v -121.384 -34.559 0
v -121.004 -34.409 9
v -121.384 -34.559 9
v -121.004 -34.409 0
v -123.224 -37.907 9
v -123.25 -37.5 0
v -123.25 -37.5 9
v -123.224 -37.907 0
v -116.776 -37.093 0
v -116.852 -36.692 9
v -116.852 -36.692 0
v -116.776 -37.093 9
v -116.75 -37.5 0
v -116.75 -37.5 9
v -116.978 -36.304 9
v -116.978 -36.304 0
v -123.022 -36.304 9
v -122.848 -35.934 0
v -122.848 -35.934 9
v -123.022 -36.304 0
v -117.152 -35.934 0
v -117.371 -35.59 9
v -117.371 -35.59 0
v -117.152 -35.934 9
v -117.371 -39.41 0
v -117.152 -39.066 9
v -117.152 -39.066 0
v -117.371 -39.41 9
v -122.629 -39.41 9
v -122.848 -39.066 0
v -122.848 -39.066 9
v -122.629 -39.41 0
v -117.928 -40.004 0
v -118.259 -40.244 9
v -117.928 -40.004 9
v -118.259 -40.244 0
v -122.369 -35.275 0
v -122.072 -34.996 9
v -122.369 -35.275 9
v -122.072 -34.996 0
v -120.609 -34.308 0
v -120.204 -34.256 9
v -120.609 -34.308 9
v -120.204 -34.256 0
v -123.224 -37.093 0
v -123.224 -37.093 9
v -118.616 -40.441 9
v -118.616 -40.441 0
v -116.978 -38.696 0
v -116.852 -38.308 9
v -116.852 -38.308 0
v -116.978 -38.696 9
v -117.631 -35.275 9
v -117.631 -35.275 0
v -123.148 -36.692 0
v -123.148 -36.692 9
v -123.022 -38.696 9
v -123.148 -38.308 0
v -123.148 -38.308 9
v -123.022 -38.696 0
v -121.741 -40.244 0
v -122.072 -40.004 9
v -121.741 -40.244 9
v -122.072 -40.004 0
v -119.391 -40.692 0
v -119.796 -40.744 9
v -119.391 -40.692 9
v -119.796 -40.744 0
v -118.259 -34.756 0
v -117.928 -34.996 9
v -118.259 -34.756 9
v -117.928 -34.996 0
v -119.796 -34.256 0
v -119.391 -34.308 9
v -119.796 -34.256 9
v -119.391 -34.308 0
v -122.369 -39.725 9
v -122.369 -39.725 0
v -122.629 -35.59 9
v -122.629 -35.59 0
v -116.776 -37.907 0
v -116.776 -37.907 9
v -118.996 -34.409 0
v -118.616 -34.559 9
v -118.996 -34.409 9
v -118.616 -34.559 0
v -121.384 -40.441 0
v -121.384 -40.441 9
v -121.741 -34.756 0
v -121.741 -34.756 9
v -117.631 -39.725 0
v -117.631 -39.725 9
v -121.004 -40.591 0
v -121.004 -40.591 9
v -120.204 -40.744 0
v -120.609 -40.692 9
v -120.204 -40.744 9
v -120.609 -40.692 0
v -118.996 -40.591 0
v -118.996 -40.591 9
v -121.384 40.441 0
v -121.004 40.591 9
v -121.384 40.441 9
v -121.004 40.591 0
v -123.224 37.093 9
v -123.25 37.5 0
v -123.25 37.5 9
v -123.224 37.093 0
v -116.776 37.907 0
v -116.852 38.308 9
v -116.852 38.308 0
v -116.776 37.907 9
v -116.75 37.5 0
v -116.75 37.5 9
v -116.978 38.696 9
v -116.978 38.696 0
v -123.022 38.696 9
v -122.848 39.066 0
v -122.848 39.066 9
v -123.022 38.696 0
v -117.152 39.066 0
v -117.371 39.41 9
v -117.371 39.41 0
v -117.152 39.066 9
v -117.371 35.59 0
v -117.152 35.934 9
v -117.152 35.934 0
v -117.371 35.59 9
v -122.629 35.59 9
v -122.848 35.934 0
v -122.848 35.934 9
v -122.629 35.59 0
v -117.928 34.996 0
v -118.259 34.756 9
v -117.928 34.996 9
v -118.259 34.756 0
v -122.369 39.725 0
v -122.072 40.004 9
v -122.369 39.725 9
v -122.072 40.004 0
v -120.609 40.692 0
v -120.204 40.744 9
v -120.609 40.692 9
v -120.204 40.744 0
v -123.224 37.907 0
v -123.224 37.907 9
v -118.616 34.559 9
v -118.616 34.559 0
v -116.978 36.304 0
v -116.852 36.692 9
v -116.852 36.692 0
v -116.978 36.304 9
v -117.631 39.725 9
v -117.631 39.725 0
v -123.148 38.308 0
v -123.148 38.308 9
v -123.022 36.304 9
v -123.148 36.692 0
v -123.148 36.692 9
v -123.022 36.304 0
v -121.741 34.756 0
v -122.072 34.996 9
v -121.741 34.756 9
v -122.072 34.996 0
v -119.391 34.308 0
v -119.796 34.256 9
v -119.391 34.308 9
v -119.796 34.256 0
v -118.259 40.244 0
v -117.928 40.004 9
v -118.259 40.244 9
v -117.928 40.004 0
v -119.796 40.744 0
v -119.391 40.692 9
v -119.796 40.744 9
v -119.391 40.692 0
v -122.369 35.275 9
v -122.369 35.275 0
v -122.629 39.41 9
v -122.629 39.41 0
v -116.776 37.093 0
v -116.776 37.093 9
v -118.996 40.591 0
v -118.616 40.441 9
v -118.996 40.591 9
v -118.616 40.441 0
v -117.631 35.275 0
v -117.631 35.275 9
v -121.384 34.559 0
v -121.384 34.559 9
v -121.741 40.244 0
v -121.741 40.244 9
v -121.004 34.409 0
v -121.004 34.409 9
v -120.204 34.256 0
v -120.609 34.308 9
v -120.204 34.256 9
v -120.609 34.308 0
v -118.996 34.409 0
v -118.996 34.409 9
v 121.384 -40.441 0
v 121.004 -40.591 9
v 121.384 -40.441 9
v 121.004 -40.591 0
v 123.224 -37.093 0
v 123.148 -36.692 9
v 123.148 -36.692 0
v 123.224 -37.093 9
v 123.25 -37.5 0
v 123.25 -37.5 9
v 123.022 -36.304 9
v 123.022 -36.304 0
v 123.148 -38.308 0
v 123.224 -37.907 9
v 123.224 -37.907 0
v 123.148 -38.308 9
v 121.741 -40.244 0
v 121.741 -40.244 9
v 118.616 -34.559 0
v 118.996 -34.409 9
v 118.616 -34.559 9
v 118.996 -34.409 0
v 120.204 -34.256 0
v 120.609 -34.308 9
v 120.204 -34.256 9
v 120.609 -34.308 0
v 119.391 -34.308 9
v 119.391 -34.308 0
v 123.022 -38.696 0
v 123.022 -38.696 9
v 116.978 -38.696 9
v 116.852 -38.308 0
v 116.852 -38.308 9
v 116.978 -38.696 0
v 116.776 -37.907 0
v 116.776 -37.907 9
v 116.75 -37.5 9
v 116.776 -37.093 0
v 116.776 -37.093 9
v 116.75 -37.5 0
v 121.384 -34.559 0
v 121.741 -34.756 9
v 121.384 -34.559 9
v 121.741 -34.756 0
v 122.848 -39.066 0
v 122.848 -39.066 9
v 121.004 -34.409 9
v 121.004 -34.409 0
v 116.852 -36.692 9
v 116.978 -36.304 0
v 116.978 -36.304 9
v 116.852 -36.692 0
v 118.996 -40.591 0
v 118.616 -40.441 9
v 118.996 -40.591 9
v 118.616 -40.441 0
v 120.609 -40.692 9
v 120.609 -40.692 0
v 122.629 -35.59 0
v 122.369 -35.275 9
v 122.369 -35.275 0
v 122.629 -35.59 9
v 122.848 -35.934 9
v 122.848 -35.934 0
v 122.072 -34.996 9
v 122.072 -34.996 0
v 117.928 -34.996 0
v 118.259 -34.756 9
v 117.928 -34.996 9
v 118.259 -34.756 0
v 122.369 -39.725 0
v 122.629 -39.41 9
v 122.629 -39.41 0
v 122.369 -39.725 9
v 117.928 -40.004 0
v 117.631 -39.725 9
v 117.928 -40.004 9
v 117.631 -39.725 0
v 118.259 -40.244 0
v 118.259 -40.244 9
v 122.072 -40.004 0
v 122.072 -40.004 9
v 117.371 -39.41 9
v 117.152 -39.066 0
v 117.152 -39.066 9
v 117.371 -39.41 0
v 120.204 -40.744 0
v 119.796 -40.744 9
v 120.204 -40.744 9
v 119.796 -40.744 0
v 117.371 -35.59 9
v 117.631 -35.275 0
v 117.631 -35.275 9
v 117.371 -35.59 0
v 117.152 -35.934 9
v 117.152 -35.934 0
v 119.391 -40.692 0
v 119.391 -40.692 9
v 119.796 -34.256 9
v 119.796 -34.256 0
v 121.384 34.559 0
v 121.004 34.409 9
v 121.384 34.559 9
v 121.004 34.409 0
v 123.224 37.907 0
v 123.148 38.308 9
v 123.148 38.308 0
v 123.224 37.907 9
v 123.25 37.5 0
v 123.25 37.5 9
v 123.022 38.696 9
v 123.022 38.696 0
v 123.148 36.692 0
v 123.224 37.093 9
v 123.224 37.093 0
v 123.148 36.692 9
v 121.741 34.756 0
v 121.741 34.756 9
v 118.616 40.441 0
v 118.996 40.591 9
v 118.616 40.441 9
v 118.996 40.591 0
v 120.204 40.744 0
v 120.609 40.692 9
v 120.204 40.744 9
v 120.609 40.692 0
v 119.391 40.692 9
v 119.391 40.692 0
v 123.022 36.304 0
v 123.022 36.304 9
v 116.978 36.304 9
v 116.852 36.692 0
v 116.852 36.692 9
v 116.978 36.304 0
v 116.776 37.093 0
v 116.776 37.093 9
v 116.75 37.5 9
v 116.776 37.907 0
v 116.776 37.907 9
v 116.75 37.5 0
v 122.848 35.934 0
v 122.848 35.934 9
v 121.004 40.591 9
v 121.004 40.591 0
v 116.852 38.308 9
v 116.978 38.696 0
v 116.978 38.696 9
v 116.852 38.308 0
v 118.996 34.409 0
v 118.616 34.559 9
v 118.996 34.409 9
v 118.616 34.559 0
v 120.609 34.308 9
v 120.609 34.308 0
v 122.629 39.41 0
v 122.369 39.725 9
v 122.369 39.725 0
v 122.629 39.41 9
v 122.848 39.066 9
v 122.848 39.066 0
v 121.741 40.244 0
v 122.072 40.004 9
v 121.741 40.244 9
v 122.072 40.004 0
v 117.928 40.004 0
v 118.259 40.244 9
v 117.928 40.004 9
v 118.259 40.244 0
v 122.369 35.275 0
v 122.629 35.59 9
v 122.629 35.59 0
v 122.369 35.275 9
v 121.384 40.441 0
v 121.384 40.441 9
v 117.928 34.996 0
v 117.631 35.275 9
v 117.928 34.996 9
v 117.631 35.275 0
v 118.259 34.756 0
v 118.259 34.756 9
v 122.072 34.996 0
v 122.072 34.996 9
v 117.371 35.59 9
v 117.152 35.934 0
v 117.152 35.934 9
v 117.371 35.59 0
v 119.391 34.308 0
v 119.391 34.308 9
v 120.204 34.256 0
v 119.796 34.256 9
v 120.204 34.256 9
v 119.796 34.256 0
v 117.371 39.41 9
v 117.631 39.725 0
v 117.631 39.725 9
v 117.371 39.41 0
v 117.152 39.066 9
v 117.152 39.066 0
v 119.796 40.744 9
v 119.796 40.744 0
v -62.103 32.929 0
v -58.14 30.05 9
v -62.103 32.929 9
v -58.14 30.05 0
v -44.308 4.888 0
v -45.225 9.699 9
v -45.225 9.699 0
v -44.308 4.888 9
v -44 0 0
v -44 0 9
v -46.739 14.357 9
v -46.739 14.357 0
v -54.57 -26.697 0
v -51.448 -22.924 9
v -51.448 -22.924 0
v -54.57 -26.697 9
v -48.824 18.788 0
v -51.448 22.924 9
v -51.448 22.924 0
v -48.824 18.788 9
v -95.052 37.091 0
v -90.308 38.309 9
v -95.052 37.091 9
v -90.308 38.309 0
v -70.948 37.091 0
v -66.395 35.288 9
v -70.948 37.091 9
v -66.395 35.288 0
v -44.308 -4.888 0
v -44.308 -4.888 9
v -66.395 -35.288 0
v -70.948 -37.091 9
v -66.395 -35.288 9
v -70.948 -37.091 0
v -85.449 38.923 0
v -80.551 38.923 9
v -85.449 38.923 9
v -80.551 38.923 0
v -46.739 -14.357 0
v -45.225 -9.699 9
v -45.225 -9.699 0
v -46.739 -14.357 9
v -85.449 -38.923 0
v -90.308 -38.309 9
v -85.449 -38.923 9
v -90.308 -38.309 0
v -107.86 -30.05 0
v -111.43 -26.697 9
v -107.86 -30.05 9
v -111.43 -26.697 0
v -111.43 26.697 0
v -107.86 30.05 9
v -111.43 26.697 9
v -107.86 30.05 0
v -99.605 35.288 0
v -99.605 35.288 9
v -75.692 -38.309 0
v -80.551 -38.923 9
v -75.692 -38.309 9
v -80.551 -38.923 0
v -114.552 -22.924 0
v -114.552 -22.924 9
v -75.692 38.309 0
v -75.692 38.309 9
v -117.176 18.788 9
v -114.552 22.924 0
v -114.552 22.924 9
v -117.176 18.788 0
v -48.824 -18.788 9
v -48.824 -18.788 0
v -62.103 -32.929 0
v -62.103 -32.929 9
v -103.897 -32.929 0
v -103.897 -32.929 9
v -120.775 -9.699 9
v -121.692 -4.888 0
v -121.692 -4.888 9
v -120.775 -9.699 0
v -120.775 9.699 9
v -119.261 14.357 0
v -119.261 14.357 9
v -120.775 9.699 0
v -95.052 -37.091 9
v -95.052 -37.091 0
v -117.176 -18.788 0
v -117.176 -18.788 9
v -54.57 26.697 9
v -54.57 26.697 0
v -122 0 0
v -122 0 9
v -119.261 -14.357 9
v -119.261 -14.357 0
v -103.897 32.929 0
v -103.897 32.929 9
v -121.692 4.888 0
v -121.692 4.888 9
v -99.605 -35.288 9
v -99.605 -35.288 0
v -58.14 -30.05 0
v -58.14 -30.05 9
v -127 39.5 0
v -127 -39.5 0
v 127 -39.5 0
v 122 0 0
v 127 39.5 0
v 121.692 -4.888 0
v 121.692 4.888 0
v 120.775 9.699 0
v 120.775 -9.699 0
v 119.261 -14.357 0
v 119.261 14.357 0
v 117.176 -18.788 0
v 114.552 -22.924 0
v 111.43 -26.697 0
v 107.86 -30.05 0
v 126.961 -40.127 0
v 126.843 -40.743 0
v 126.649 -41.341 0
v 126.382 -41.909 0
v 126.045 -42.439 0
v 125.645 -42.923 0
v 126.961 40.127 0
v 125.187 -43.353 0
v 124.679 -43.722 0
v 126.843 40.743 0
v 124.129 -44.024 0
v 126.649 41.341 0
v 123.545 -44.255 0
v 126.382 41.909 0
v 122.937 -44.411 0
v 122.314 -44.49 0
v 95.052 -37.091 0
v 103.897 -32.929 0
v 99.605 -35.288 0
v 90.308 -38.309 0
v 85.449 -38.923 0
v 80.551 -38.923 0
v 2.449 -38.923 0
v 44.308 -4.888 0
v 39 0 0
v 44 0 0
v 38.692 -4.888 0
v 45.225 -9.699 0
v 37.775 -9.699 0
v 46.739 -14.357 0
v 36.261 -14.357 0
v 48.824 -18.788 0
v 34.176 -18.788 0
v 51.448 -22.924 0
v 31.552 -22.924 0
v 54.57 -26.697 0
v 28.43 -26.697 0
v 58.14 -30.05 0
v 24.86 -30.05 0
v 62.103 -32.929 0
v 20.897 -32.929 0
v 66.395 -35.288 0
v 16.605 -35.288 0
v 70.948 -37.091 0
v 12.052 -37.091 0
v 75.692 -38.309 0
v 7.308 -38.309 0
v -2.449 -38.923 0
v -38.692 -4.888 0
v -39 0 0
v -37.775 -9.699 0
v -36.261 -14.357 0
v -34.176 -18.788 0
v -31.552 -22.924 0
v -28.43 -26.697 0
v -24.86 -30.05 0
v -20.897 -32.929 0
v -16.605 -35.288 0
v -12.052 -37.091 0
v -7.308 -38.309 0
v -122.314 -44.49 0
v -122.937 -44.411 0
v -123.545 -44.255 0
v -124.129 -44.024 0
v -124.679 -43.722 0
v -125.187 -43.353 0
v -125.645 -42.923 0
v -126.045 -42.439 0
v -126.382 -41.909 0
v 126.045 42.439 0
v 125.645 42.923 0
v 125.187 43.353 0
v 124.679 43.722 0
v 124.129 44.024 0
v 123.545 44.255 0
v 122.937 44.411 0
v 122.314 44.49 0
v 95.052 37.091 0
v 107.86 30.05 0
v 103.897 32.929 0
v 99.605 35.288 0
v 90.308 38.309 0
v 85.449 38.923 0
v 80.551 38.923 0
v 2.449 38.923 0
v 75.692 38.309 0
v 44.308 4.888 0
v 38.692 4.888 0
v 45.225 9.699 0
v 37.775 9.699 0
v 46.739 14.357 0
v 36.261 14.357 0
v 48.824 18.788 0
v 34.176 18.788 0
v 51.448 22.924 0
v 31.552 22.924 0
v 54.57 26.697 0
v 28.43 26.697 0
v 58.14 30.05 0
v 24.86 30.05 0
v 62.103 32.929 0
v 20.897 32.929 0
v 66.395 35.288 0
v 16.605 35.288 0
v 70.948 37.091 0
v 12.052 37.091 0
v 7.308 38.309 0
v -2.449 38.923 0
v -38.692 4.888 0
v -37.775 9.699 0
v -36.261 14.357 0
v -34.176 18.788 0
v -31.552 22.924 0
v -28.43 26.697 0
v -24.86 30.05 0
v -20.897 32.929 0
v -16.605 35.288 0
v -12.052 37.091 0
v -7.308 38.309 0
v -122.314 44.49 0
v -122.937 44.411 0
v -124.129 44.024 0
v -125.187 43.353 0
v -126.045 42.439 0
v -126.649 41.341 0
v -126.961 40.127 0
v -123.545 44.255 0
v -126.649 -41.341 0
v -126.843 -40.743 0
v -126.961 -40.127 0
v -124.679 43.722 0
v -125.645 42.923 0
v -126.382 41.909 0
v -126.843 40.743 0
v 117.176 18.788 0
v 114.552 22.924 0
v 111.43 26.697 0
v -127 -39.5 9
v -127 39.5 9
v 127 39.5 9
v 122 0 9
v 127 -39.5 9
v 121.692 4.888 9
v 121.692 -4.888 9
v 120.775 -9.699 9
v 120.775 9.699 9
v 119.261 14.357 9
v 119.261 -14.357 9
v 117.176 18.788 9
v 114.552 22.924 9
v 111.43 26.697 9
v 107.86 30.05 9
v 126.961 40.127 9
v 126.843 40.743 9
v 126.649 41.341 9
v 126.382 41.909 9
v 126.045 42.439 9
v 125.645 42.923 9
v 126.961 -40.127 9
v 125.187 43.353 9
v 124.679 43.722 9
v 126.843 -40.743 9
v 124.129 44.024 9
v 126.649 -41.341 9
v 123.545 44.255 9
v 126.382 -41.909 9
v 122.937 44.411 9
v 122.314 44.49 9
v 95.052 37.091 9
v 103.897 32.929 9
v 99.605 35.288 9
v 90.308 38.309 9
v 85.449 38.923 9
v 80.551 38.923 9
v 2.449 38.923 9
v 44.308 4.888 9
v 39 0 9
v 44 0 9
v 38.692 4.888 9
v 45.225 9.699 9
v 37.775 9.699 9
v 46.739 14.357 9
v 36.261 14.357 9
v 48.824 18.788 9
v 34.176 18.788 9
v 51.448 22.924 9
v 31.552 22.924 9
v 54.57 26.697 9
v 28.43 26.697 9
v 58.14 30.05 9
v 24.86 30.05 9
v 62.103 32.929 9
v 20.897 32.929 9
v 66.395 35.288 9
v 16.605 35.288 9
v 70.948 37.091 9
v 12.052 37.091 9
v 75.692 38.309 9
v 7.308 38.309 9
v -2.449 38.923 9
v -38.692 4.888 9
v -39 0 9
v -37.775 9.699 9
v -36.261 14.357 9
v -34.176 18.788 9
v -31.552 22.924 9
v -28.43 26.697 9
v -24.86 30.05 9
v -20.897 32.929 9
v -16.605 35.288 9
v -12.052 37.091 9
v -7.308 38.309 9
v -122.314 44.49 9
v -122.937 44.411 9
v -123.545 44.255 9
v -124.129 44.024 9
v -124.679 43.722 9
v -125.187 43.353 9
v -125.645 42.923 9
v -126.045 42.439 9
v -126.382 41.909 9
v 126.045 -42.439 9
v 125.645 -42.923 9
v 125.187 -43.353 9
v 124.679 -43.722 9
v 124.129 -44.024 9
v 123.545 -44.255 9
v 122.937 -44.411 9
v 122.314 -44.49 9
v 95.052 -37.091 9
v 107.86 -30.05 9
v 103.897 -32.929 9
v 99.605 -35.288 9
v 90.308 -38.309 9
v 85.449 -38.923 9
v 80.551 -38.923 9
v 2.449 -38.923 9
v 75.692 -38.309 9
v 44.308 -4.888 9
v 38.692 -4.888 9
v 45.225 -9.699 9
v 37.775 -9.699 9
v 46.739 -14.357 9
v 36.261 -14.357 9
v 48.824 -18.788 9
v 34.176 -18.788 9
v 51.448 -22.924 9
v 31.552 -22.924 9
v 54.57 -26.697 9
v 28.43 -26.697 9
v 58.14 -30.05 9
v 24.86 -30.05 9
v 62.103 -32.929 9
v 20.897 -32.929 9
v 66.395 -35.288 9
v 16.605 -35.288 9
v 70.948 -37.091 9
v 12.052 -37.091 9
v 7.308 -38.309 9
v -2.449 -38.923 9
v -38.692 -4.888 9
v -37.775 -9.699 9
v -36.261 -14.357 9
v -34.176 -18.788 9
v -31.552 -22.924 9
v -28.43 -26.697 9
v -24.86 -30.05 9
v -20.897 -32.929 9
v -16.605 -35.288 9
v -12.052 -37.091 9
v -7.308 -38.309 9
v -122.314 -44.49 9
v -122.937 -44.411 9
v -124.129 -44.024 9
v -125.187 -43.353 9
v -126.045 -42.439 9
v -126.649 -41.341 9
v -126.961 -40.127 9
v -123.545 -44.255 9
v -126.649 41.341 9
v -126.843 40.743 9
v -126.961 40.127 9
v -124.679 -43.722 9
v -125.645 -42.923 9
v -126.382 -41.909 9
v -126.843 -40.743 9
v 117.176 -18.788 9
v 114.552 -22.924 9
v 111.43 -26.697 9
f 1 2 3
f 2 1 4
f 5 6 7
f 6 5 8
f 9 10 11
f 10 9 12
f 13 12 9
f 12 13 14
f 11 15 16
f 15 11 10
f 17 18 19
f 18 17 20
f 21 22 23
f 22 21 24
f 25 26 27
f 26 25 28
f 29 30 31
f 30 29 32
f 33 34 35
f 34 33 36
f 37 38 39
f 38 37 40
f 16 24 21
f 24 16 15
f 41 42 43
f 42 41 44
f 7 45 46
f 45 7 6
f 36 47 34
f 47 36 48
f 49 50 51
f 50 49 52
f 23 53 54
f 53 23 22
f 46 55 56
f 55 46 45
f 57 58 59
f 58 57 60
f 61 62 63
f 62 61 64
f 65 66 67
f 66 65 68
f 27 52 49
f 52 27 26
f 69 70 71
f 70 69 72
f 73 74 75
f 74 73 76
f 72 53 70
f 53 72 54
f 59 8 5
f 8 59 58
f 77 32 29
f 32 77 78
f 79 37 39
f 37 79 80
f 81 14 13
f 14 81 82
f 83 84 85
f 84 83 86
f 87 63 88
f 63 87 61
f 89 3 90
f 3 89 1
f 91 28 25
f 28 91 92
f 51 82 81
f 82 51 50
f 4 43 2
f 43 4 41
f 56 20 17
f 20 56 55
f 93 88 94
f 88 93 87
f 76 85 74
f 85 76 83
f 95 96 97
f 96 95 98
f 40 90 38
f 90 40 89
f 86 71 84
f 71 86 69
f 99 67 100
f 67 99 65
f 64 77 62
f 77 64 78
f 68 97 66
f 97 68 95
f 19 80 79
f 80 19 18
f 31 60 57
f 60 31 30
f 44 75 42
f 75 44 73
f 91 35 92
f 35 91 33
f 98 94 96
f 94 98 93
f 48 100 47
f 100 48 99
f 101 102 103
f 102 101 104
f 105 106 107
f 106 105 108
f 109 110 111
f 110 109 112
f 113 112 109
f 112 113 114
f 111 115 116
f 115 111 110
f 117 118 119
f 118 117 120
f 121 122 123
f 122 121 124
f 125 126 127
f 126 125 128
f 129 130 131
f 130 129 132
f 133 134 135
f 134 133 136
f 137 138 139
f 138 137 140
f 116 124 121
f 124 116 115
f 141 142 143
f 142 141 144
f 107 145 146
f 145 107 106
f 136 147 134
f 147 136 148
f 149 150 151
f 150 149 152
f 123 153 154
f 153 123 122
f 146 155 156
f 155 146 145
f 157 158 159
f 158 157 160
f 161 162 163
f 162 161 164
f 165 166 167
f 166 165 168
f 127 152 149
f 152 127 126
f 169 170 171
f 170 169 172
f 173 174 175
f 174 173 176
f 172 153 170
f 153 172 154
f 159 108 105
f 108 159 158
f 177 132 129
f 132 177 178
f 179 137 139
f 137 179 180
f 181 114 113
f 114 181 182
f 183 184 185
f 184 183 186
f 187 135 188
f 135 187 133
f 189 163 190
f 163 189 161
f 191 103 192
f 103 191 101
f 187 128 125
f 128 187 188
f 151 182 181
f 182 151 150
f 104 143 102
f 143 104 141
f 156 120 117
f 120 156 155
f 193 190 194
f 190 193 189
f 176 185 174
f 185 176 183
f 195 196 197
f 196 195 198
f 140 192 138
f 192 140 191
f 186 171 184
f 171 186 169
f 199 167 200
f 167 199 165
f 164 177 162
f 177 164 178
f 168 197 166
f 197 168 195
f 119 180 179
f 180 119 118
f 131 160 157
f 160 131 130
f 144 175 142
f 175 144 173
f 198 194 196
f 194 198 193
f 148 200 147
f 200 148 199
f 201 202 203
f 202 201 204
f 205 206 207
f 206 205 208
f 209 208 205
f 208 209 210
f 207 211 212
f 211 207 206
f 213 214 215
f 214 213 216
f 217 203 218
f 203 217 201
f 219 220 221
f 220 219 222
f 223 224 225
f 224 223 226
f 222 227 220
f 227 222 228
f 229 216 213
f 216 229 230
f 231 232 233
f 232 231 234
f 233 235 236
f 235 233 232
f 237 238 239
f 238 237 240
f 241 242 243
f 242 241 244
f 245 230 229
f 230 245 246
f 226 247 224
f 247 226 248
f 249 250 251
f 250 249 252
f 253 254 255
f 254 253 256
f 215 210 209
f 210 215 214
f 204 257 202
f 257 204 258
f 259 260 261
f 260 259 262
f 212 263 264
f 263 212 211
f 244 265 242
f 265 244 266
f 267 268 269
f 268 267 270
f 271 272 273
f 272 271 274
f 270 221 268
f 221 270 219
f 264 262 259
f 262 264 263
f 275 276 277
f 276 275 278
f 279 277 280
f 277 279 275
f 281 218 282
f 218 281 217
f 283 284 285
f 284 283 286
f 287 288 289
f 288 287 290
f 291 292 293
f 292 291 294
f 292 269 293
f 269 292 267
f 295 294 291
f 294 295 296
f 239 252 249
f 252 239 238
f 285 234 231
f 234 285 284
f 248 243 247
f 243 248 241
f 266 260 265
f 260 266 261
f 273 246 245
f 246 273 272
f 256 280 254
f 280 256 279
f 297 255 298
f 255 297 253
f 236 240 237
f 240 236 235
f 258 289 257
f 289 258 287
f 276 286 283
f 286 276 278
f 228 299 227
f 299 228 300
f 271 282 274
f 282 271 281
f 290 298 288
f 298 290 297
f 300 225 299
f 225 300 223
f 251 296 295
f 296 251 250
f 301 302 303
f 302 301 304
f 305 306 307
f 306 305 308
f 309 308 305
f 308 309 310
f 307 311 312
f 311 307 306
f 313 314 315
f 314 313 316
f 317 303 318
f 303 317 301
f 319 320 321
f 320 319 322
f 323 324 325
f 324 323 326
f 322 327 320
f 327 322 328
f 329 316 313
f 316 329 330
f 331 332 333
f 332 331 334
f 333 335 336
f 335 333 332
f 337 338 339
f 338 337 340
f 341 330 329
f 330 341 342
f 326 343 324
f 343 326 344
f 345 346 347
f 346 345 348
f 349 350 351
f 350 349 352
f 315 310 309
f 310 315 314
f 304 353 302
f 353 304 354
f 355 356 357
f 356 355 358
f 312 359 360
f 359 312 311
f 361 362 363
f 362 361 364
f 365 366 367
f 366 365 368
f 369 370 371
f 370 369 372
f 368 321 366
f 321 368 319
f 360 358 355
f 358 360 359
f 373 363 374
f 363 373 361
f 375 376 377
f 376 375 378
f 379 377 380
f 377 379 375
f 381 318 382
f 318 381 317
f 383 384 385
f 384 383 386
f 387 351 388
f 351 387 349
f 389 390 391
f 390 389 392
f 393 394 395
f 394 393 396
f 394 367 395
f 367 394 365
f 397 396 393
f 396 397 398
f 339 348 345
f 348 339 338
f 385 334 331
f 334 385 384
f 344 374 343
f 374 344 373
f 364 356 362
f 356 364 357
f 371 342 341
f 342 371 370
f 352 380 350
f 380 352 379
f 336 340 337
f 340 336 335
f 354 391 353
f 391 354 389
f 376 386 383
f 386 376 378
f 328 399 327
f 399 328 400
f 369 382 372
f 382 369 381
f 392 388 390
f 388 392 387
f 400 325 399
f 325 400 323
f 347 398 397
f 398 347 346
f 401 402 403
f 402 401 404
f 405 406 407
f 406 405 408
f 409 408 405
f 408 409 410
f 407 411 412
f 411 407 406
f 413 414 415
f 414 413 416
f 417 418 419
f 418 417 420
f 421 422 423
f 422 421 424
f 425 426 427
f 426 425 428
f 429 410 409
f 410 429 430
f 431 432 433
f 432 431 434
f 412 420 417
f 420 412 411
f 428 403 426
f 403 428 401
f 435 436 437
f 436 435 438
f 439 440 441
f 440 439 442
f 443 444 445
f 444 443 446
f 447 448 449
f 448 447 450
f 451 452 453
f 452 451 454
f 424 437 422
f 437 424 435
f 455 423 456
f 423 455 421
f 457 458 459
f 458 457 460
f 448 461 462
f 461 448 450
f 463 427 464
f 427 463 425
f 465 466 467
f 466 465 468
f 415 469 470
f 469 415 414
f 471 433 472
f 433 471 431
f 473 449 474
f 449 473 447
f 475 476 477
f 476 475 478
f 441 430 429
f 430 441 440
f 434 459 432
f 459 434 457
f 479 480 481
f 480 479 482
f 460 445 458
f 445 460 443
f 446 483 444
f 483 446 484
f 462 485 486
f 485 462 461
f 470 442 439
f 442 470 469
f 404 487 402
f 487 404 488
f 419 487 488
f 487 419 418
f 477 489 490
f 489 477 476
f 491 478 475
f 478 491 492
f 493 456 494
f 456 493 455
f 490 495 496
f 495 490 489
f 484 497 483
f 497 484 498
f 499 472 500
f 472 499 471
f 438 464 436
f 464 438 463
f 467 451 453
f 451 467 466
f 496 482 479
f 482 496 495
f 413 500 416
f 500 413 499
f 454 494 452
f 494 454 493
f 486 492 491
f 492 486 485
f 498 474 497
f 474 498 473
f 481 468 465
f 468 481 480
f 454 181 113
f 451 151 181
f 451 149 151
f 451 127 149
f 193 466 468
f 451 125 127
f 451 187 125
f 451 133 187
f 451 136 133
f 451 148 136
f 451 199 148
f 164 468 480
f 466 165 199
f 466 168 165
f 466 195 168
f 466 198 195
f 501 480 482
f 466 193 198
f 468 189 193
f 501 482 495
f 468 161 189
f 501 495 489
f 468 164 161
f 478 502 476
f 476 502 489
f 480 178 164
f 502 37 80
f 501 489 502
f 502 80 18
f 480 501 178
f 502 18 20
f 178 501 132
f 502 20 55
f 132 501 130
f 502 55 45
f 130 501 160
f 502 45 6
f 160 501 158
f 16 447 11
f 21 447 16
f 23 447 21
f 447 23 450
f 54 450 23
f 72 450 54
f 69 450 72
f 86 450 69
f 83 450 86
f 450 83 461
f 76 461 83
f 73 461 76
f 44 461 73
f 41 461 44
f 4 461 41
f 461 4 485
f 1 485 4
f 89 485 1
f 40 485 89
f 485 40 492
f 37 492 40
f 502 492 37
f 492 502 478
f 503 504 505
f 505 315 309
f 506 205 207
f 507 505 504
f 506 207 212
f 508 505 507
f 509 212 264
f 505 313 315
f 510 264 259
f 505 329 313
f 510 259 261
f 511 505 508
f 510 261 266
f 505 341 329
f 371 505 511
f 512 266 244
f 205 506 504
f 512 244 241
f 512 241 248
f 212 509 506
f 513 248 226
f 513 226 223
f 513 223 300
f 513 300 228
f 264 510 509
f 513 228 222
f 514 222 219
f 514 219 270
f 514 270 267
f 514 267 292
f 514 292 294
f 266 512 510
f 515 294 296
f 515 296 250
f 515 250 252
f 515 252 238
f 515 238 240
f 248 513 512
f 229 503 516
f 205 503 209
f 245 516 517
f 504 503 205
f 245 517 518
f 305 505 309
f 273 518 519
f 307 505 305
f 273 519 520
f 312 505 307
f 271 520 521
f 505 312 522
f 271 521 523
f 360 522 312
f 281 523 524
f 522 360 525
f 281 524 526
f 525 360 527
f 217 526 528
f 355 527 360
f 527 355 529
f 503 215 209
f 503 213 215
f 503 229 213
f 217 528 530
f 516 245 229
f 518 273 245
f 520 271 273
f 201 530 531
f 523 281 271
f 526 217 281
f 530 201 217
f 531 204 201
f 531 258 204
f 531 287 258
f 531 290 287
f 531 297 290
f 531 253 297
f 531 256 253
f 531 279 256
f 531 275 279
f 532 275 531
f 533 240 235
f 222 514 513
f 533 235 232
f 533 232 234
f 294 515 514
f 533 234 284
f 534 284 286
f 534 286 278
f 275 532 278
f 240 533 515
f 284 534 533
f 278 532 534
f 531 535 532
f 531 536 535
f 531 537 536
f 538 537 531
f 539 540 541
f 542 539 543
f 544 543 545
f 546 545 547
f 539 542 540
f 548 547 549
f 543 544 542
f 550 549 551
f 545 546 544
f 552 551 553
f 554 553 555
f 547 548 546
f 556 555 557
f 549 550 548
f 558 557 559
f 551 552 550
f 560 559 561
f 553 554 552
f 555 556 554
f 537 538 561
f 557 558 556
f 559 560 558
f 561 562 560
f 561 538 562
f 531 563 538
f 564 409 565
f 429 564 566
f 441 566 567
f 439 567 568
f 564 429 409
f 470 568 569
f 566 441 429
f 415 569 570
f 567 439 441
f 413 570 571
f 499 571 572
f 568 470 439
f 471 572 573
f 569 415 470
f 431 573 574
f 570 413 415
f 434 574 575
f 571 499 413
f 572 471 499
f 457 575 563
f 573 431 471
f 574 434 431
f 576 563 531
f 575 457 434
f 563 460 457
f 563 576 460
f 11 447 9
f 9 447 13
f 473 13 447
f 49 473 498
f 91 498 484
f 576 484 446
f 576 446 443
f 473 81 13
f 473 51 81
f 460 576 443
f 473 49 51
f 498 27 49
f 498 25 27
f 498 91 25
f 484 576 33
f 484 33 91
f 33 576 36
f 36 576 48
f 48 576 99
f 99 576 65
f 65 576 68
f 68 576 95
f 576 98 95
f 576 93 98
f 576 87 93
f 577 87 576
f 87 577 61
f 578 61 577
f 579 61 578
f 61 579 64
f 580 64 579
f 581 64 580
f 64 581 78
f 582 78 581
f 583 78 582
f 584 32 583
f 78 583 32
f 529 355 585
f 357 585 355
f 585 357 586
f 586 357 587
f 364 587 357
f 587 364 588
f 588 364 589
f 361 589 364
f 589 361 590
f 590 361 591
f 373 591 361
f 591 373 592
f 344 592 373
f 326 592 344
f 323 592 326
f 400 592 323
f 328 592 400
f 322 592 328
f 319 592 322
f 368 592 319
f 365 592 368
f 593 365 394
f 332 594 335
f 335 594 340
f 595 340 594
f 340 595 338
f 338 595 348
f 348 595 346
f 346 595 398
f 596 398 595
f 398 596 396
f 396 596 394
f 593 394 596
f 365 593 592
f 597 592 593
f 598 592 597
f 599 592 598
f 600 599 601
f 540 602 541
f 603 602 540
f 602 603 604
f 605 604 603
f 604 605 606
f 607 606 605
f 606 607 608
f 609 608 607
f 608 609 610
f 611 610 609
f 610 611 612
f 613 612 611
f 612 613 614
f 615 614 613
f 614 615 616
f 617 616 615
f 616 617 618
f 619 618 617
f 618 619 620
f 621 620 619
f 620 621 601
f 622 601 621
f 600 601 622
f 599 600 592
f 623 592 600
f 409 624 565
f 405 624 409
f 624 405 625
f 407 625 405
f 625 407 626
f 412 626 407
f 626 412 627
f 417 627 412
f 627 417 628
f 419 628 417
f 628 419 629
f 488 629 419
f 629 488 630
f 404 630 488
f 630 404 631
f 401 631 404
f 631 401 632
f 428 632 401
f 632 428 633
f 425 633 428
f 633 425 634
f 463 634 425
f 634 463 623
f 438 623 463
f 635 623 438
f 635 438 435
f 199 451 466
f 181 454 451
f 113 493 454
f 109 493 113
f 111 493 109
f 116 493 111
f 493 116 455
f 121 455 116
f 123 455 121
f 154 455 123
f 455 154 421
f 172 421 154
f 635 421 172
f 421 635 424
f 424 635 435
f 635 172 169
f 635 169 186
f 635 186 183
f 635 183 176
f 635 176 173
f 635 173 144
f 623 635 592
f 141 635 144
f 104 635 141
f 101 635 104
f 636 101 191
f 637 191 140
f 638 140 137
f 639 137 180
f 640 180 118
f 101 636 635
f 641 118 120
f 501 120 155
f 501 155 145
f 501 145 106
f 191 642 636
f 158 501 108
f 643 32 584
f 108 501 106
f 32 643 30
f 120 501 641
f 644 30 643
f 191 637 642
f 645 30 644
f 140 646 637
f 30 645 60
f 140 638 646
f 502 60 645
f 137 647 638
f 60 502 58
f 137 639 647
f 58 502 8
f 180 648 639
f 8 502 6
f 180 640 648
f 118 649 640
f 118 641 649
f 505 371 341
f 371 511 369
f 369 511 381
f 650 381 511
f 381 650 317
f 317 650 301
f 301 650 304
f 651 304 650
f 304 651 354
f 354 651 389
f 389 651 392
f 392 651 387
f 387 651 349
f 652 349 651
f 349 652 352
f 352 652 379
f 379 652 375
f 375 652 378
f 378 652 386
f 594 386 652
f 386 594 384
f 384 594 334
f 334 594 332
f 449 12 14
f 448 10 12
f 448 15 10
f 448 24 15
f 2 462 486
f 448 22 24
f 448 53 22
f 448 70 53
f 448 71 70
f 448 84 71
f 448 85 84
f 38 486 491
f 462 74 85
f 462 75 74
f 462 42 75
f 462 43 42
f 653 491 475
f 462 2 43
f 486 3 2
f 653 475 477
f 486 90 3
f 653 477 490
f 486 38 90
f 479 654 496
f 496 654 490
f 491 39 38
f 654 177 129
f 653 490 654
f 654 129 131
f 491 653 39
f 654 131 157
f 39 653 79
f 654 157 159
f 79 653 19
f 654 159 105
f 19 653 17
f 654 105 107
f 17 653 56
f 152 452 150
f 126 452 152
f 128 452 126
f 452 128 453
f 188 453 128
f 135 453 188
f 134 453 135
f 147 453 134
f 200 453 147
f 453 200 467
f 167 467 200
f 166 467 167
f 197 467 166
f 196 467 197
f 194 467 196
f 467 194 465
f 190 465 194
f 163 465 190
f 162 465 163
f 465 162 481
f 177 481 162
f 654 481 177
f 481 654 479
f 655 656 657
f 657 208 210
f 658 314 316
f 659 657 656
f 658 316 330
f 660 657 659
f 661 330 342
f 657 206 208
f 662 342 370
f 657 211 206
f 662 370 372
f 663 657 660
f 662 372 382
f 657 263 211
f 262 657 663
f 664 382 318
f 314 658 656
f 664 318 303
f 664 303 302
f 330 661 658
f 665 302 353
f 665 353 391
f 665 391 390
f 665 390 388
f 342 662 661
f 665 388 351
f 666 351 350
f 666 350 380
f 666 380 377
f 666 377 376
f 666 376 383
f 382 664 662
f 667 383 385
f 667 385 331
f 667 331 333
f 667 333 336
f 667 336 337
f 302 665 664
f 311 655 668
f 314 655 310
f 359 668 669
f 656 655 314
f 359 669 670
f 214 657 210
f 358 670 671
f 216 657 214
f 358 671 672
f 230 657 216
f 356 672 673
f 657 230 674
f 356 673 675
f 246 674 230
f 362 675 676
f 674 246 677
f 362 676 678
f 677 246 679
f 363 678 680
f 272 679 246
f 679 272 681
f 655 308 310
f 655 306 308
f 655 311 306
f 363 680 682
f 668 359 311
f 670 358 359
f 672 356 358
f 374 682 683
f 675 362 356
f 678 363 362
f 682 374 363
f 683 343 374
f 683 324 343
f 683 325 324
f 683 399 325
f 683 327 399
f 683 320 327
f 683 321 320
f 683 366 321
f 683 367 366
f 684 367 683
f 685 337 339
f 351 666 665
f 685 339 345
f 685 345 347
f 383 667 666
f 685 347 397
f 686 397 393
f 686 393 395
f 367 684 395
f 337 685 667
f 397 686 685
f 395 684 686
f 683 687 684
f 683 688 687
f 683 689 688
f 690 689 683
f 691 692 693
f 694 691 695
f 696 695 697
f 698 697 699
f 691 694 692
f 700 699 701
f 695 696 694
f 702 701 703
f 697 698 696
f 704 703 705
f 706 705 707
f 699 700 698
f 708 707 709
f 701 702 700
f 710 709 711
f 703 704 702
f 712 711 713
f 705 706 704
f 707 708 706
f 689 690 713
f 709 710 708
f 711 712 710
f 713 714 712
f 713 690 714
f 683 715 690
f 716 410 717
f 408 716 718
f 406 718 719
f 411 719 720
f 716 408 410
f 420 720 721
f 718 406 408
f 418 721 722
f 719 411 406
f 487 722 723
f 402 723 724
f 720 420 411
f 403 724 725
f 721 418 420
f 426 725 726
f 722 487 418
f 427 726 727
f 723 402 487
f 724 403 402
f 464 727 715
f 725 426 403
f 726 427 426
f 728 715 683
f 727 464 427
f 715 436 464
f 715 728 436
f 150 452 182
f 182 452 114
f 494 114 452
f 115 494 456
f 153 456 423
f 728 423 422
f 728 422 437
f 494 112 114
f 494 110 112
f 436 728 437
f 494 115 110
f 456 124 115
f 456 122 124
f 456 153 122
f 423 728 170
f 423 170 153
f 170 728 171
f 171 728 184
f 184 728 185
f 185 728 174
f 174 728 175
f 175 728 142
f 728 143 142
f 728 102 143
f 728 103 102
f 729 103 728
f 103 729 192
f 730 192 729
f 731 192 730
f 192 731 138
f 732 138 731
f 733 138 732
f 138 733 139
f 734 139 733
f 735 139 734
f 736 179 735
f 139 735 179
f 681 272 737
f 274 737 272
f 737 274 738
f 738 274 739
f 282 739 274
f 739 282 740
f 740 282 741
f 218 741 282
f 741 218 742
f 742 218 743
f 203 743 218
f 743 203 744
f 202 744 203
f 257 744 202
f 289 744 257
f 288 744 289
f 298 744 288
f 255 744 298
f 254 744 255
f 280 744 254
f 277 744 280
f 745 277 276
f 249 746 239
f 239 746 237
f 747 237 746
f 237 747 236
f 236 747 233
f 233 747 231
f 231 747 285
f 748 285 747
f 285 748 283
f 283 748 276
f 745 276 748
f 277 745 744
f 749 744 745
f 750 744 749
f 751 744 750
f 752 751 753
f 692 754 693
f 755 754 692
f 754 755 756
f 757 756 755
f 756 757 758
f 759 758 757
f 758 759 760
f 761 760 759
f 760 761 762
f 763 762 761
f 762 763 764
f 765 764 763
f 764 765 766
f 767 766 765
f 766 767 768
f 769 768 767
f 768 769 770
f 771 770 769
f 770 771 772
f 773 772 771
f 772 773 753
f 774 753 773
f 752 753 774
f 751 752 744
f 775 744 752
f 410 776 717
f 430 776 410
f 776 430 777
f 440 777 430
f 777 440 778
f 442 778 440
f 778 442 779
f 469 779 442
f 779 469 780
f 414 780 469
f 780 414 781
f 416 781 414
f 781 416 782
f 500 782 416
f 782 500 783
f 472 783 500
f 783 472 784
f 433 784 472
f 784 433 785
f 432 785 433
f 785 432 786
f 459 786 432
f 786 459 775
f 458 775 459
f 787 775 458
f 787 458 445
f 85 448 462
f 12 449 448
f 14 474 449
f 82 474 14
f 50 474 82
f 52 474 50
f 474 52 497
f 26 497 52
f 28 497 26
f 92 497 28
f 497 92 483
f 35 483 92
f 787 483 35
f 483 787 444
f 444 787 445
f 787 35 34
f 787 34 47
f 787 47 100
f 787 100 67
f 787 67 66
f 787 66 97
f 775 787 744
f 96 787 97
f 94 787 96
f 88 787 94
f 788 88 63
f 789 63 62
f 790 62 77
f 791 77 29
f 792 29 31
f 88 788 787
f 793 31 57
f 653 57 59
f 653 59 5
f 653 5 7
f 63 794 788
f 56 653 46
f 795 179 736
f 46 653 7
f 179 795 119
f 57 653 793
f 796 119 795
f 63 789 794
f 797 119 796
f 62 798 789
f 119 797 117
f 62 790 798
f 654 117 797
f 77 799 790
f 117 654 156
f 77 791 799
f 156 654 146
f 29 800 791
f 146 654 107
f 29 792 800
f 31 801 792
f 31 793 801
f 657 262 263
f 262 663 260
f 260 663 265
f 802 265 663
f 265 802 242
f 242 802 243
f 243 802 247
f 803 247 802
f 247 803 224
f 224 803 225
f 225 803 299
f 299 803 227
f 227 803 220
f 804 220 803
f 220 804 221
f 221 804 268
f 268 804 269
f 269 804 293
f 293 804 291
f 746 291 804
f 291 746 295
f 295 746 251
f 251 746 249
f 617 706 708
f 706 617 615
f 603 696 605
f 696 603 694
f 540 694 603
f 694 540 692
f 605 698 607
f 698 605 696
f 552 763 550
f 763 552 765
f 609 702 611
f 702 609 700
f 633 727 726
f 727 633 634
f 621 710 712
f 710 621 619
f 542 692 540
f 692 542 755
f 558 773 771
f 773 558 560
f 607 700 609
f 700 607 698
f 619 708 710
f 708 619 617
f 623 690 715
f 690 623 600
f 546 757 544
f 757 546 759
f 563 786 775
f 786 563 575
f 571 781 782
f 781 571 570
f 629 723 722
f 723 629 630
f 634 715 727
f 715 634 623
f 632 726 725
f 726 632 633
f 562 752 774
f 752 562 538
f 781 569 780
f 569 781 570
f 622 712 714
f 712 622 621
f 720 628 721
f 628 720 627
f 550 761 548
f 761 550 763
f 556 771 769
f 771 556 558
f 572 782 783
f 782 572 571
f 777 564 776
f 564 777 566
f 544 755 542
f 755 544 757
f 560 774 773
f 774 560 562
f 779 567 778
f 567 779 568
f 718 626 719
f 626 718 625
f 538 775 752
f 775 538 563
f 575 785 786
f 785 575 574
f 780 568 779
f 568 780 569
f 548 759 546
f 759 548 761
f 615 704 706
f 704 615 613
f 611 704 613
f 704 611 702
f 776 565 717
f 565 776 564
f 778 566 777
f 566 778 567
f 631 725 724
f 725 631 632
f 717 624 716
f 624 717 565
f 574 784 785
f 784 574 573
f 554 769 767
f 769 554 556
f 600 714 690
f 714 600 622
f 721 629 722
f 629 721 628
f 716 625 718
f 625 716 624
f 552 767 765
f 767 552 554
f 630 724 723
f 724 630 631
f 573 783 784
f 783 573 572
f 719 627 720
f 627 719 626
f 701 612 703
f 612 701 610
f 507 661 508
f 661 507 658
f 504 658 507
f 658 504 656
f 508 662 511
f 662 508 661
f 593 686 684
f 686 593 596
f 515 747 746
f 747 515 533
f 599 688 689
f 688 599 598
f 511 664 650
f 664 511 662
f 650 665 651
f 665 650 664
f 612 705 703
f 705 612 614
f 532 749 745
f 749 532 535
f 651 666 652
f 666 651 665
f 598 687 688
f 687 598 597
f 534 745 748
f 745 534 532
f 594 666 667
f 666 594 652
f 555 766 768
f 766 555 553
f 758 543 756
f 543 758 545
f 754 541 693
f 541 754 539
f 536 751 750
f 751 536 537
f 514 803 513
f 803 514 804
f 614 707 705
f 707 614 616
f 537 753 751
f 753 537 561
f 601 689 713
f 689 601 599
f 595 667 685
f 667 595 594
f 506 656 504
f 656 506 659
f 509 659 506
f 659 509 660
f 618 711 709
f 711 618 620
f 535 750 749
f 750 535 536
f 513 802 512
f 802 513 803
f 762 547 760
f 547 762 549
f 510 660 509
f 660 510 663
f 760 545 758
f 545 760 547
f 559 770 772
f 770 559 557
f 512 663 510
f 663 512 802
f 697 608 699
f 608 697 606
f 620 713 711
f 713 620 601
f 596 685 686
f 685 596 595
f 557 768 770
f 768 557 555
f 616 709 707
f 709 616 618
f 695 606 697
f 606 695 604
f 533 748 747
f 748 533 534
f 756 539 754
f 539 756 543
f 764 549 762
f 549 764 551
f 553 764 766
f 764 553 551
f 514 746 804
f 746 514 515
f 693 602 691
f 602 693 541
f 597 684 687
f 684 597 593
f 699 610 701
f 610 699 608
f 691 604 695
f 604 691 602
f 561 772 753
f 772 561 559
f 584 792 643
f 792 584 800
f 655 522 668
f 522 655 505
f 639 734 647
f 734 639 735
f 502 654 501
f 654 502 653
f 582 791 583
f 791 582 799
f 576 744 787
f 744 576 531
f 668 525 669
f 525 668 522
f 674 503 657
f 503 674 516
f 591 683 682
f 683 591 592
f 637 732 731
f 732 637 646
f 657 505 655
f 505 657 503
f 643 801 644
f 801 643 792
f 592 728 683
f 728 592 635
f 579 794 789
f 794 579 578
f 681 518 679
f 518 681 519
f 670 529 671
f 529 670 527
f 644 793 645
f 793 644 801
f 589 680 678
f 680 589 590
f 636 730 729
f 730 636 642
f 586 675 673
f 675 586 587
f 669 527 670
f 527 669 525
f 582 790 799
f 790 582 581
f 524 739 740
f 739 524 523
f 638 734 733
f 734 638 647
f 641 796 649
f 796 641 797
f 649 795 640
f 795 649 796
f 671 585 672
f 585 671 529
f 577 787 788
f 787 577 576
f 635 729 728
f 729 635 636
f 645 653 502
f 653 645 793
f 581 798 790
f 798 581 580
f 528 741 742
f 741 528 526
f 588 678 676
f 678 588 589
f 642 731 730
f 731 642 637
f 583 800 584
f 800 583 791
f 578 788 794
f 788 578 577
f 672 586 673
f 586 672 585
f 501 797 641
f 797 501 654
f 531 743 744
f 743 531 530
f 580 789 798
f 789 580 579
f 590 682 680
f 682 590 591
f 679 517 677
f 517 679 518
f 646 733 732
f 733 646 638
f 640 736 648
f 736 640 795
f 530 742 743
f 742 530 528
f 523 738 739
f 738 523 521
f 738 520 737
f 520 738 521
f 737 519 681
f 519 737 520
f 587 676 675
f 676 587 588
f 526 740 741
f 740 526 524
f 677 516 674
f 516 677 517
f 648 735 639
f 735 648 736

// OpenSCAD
$fn = 50;


difference() {
	union() {
		hull() {
			translate(v = [-122.0000000000, 39.5000000000, 0]) {
				cylinder(h = 9, r = 5);
			}
			translate(v = [122.0000000000, 39.5000000000, 0]) {
				cylinder(h = 9, r = 5);
			}
			translate(v = [-122.0000000000, -39.5000000000, 0]) {
				cylinder(h = 9, r = 5);
			}
			translate(v = [122.0000000000, -39.5000000000, 0]) {
				cylinder(h = 9, r = 5);
			}
		}
	}
	union() {
		#translate(v = [-120.0000000000, -37.5000000000, -100.0000000000]) {
			cylinder(h = 200, r = 3.2500000000);
		}
		#translate(v = [-120.0000000000, 37.5000000000, -100.0000000000]) {
			cylinder(h = 200, r = 3.2500000000);
		}
		#translate(v = [120.0000000000, -37.5000000000, -100.0000000000]) {
			cylinder(h = 200, r = 3.2500000000);
		}
		#translate(v = [120.0000000000, 37.5000000000, -100.0000000000]) {
			cylinder(h = 200, r = 3.2500000000);
		}
		#translate(v = [-83.0000000000, 0, 0]) {
			cylinder(h = 9, r = 39.0000000000);
		}
		#cylinder(h = 9, r = 39.0000000000);
		#translate(v = [83.0000000000, 0, 0]) {
			cylinder(h = 9, r = 39.0000000000);
		}
	}
}
